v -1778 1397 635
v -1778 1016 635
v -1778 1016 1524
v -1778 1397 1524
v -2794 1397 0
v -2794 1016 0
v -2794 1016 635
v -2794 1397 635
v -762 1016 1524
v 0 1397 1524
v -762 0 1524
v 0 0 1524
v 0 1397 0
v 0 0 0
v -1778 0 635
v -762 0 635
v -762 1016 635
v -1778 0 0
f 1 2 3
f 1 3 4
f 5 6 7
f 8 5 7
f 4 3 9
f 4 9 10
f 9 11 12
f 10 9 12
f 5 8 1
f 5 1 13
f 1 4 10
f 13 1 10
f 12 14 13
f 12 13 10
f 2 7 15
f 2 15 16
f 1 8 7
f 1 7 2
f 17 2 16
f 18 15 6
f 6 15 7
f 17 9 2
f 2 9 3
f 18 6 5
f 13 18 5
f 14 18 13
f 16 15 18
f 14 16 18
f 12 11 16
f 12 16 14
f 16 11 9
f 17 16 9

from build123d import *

# Parameters (mm, degrees)
F0_W     = 2794
F0_H     = 1524
F1_DEPTH = 1397
F3_DEPTH = 889
F5_DEPTH = 1270


with BuildPart() as f1:
    # F0 (on Front) → F1 (new body)
    with BuildSketch(Plane.XZ):
        with Locations((-1397, 762)):
            Rectangle(F0_W, F0_H)
    extrude(amount=-F1_DEPTH)

    # F2 (on face) → F3 (cut)
    with BuildSketch(Plane.XY.offset(1524)):
        Polygon((-1778, 1016), (-1778, 1397), (-2794, 1397), (-2794, 0), (-762, 0), (-762, 1016), align=None)
    extrude(amount=-F3_DEPTH, mode=Mode.SUBTRACT)

    # F4 (on face) → F5 (cut)
    with BuildSketch(Plane.XY.offset(635)):
        Polygon((-1778, 0), (-2794, 1016), (-2794, 0), align=None)
    extrude(amount=-F5_DEPTH, mode=Mode.SUBTRACT)


solid = f1.part
